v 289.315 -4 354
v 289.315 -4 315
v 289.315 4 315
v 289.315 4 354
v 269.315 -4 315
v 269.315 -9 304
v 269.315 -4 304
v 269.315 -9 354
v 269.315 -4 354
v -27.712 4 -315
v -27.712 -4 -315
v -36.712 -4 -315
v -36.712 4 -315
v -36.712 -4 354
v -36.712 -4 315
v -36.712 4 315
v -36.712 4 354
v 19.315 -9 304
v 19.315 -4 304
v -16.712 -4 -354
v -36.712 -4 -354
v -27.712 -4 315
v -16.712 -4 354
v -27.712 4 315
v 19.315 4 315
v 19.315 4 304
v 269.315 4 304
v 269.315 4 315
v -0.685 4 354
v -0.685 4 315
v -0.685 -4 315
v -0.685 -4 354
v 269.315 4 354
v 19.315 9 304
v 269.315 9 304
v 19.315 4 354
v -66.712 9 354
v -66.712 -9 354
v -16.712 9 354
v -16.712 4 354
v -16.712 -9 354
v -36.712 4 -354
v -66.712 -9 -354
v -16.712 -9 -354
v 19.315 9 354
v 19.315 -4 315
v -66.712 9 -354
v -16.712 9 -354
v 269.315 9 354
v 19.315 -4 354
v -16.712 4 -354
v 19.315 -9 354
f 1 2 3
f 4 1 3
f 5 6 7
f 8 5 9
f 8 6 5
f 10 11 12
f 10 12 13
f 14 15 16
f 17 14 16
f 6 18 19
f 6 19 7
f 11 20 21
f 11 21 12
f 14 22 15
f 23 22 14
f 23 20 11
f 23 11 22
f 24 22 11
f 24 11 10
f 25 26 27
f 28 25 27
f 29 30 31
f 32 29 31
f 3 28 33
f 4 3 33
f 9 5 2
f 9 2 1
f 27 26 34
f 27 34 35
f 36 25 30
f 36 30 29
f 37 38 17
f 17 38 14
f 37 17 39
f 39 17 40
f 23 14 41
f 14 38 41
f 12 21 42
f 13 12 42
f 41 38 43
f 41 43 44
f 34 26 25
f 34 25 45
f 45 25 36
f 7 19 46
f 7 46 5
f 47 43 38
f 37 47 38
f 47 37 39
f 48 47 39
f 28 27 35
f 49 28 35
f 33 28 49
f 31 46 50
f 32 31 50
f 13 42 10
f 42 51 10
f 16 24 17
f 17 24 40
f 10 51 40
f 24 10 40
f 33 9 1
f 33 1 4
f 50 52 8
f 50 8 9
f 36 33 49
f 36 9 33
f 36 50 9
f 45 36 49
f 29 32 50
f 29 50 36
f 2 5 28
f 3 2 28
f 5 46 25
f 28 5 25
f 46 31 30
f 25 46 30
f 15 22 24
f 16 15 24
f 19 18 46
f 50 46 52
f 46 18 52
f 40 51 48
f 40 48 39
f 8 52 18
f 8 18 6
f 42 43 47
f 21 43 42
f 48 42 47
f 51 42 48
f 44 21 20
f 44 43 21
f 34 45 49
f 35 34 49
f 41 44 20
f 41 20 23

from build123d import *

# Parameters (mm, degrees)
F0_W      = 250
F0_H      = 50
F1_DEPTH  = 9
F0_W_2    = 50
F0_H_2    = 708
F2_W      = 8
F2_H      = 708
F3_DEPTH  = 11
F4_W      = 8
F4_H      = 39
F5_DEPTH  = 9
F6_W      = 8
F6_H      = 708
F7_DEPTH  = 11
F8_W      = 8
F8_H      = 50
F9_DEPTH  = 9
F10_W     = 250
F10_H     = 8
F11_DEPTH = 11
F12_W     = 8
F12_H     = 39
F13_DEPTH = 20
F14_W     = 8
F14_H     = 39
F15_DEPTH = 20


with BuildPart() as f1:
    # F0 (on Front) → F1 (new body, symmetric)
    with BuildSketch(Plane.XZ):
        with Locations((144.3151421845, 329)):
            Rectangle(F0_W, F0_H)
    extrude(amount=F1_DEPTH, both=True)

    # F10 (on face) → F11 (cut)
    with BuildSketch(Plane(origin=(0, 0, 304), x_dir=(1, 0, 0), z_dir=(0, 0, -1))):
        with Locations((144.3151421845, 0)):
            Rectangle(F10_W, F10_H)
    extrude(amount=-F11_DEPTH, mode=Mode.SUBTRACT)

    # F12 (on face) → F13 (join)
    with BuildSketch(Plane(origin=(19.3151421845, 0, 0), x_dir=(0, -1, 0), z_dir=(-1, 0, 0))):
        with Locations((0, 334.5)):
            Rectangle(F12_W, F12_H)
    extrude(amount=F13_DEPTH)

    # F14 (on face) → F15 (join)
    with BuildSketch(Plane.YZ.offset(269.3151421845)):
        with Locations((0, 334.5)):
            Rectangle(F14_W, F14_H)
    extrude(amount=F15_DEPTH)


with BuildPart() as f1b:
    # F0 (on Front) → F1, piece 2 (new body, symmetric)
    with BuildSketch(Plane.XZ):
        with Locations((-41.7115390301, 0)):
            Rectangle(F0_W_2, F0_H_2)
    extrude(amount=F1_DEPTH, both=True)

    # F2 (on face) → F3 (cut)
    with BuildSketch(Plane.YZ.offset(-16.7115390301)):
        Rectangle(F2_W, F2_H)
    extrude(amount=-F3_DEPTH, mode=Mode.SUBTRACT)

    # F4 (on face) → F5 (cut)
    with BuildSketch(Plane.YZ.offset(-27.7115390301)):
        with Locations((0, 334.5)):
            Rectangle(F4_W, F4_H)
        with Locations((0, -334.5)):
            Rectangle(F4_W, F4_H)
    extrude(amount=-F5_DEPTH, mode=Mode.SUBTRACT)


with BuildPart() as f1c:
    # F0 (on Front) → F1, piece 3 (new body, symmetric)
    with BuildSketch(Plane.XZ):
        with Locations((319.8899328709, 0)):
            Rectangle(F0_W_2, F0_H_2)
    extrude(amount=F1_DEPTH, both=True)

    # F6 (on face) → F7 (cut)
    with BuildSketch(Plane(origin=(294.8899328709, 0, 0), x_dir=(0, -1, 0), z_dir=(-1, 0, 0))):
        Rectangle(F6_W, F6_H)
    extrude(amount=-F7_DEPTH, mode=Mode.SUBTRACT)

    # F8 (on face) → F9 (cut)
    with BuildSketch(Plane(origin=(305.8899328709, 0, 0), x_dir=(0, -1, 0), z_dir=(-1, 0, 0))):
        with Locations((0, 329)):
            Rectangle(F8_W, F8_H)
        with Locations((0, -329)):
            Rectangle(F8_W, F8_H)
    extrude(amount=-F9_DEPTH, mode=Mode.SUBTRACT)


with BuildPart() as f1d:
    # F0 (on Front) → F1, piece 4 (new body, symmetric)
    with BuildSketch(Plane.XZ):
        with Locations((144.3151421845, -329)):
            Rectangle(F0_W, F0_H)
    extrude(amount=F1_DEPTH, both=True)


solid = Compound([f1.part, f1b.part])
